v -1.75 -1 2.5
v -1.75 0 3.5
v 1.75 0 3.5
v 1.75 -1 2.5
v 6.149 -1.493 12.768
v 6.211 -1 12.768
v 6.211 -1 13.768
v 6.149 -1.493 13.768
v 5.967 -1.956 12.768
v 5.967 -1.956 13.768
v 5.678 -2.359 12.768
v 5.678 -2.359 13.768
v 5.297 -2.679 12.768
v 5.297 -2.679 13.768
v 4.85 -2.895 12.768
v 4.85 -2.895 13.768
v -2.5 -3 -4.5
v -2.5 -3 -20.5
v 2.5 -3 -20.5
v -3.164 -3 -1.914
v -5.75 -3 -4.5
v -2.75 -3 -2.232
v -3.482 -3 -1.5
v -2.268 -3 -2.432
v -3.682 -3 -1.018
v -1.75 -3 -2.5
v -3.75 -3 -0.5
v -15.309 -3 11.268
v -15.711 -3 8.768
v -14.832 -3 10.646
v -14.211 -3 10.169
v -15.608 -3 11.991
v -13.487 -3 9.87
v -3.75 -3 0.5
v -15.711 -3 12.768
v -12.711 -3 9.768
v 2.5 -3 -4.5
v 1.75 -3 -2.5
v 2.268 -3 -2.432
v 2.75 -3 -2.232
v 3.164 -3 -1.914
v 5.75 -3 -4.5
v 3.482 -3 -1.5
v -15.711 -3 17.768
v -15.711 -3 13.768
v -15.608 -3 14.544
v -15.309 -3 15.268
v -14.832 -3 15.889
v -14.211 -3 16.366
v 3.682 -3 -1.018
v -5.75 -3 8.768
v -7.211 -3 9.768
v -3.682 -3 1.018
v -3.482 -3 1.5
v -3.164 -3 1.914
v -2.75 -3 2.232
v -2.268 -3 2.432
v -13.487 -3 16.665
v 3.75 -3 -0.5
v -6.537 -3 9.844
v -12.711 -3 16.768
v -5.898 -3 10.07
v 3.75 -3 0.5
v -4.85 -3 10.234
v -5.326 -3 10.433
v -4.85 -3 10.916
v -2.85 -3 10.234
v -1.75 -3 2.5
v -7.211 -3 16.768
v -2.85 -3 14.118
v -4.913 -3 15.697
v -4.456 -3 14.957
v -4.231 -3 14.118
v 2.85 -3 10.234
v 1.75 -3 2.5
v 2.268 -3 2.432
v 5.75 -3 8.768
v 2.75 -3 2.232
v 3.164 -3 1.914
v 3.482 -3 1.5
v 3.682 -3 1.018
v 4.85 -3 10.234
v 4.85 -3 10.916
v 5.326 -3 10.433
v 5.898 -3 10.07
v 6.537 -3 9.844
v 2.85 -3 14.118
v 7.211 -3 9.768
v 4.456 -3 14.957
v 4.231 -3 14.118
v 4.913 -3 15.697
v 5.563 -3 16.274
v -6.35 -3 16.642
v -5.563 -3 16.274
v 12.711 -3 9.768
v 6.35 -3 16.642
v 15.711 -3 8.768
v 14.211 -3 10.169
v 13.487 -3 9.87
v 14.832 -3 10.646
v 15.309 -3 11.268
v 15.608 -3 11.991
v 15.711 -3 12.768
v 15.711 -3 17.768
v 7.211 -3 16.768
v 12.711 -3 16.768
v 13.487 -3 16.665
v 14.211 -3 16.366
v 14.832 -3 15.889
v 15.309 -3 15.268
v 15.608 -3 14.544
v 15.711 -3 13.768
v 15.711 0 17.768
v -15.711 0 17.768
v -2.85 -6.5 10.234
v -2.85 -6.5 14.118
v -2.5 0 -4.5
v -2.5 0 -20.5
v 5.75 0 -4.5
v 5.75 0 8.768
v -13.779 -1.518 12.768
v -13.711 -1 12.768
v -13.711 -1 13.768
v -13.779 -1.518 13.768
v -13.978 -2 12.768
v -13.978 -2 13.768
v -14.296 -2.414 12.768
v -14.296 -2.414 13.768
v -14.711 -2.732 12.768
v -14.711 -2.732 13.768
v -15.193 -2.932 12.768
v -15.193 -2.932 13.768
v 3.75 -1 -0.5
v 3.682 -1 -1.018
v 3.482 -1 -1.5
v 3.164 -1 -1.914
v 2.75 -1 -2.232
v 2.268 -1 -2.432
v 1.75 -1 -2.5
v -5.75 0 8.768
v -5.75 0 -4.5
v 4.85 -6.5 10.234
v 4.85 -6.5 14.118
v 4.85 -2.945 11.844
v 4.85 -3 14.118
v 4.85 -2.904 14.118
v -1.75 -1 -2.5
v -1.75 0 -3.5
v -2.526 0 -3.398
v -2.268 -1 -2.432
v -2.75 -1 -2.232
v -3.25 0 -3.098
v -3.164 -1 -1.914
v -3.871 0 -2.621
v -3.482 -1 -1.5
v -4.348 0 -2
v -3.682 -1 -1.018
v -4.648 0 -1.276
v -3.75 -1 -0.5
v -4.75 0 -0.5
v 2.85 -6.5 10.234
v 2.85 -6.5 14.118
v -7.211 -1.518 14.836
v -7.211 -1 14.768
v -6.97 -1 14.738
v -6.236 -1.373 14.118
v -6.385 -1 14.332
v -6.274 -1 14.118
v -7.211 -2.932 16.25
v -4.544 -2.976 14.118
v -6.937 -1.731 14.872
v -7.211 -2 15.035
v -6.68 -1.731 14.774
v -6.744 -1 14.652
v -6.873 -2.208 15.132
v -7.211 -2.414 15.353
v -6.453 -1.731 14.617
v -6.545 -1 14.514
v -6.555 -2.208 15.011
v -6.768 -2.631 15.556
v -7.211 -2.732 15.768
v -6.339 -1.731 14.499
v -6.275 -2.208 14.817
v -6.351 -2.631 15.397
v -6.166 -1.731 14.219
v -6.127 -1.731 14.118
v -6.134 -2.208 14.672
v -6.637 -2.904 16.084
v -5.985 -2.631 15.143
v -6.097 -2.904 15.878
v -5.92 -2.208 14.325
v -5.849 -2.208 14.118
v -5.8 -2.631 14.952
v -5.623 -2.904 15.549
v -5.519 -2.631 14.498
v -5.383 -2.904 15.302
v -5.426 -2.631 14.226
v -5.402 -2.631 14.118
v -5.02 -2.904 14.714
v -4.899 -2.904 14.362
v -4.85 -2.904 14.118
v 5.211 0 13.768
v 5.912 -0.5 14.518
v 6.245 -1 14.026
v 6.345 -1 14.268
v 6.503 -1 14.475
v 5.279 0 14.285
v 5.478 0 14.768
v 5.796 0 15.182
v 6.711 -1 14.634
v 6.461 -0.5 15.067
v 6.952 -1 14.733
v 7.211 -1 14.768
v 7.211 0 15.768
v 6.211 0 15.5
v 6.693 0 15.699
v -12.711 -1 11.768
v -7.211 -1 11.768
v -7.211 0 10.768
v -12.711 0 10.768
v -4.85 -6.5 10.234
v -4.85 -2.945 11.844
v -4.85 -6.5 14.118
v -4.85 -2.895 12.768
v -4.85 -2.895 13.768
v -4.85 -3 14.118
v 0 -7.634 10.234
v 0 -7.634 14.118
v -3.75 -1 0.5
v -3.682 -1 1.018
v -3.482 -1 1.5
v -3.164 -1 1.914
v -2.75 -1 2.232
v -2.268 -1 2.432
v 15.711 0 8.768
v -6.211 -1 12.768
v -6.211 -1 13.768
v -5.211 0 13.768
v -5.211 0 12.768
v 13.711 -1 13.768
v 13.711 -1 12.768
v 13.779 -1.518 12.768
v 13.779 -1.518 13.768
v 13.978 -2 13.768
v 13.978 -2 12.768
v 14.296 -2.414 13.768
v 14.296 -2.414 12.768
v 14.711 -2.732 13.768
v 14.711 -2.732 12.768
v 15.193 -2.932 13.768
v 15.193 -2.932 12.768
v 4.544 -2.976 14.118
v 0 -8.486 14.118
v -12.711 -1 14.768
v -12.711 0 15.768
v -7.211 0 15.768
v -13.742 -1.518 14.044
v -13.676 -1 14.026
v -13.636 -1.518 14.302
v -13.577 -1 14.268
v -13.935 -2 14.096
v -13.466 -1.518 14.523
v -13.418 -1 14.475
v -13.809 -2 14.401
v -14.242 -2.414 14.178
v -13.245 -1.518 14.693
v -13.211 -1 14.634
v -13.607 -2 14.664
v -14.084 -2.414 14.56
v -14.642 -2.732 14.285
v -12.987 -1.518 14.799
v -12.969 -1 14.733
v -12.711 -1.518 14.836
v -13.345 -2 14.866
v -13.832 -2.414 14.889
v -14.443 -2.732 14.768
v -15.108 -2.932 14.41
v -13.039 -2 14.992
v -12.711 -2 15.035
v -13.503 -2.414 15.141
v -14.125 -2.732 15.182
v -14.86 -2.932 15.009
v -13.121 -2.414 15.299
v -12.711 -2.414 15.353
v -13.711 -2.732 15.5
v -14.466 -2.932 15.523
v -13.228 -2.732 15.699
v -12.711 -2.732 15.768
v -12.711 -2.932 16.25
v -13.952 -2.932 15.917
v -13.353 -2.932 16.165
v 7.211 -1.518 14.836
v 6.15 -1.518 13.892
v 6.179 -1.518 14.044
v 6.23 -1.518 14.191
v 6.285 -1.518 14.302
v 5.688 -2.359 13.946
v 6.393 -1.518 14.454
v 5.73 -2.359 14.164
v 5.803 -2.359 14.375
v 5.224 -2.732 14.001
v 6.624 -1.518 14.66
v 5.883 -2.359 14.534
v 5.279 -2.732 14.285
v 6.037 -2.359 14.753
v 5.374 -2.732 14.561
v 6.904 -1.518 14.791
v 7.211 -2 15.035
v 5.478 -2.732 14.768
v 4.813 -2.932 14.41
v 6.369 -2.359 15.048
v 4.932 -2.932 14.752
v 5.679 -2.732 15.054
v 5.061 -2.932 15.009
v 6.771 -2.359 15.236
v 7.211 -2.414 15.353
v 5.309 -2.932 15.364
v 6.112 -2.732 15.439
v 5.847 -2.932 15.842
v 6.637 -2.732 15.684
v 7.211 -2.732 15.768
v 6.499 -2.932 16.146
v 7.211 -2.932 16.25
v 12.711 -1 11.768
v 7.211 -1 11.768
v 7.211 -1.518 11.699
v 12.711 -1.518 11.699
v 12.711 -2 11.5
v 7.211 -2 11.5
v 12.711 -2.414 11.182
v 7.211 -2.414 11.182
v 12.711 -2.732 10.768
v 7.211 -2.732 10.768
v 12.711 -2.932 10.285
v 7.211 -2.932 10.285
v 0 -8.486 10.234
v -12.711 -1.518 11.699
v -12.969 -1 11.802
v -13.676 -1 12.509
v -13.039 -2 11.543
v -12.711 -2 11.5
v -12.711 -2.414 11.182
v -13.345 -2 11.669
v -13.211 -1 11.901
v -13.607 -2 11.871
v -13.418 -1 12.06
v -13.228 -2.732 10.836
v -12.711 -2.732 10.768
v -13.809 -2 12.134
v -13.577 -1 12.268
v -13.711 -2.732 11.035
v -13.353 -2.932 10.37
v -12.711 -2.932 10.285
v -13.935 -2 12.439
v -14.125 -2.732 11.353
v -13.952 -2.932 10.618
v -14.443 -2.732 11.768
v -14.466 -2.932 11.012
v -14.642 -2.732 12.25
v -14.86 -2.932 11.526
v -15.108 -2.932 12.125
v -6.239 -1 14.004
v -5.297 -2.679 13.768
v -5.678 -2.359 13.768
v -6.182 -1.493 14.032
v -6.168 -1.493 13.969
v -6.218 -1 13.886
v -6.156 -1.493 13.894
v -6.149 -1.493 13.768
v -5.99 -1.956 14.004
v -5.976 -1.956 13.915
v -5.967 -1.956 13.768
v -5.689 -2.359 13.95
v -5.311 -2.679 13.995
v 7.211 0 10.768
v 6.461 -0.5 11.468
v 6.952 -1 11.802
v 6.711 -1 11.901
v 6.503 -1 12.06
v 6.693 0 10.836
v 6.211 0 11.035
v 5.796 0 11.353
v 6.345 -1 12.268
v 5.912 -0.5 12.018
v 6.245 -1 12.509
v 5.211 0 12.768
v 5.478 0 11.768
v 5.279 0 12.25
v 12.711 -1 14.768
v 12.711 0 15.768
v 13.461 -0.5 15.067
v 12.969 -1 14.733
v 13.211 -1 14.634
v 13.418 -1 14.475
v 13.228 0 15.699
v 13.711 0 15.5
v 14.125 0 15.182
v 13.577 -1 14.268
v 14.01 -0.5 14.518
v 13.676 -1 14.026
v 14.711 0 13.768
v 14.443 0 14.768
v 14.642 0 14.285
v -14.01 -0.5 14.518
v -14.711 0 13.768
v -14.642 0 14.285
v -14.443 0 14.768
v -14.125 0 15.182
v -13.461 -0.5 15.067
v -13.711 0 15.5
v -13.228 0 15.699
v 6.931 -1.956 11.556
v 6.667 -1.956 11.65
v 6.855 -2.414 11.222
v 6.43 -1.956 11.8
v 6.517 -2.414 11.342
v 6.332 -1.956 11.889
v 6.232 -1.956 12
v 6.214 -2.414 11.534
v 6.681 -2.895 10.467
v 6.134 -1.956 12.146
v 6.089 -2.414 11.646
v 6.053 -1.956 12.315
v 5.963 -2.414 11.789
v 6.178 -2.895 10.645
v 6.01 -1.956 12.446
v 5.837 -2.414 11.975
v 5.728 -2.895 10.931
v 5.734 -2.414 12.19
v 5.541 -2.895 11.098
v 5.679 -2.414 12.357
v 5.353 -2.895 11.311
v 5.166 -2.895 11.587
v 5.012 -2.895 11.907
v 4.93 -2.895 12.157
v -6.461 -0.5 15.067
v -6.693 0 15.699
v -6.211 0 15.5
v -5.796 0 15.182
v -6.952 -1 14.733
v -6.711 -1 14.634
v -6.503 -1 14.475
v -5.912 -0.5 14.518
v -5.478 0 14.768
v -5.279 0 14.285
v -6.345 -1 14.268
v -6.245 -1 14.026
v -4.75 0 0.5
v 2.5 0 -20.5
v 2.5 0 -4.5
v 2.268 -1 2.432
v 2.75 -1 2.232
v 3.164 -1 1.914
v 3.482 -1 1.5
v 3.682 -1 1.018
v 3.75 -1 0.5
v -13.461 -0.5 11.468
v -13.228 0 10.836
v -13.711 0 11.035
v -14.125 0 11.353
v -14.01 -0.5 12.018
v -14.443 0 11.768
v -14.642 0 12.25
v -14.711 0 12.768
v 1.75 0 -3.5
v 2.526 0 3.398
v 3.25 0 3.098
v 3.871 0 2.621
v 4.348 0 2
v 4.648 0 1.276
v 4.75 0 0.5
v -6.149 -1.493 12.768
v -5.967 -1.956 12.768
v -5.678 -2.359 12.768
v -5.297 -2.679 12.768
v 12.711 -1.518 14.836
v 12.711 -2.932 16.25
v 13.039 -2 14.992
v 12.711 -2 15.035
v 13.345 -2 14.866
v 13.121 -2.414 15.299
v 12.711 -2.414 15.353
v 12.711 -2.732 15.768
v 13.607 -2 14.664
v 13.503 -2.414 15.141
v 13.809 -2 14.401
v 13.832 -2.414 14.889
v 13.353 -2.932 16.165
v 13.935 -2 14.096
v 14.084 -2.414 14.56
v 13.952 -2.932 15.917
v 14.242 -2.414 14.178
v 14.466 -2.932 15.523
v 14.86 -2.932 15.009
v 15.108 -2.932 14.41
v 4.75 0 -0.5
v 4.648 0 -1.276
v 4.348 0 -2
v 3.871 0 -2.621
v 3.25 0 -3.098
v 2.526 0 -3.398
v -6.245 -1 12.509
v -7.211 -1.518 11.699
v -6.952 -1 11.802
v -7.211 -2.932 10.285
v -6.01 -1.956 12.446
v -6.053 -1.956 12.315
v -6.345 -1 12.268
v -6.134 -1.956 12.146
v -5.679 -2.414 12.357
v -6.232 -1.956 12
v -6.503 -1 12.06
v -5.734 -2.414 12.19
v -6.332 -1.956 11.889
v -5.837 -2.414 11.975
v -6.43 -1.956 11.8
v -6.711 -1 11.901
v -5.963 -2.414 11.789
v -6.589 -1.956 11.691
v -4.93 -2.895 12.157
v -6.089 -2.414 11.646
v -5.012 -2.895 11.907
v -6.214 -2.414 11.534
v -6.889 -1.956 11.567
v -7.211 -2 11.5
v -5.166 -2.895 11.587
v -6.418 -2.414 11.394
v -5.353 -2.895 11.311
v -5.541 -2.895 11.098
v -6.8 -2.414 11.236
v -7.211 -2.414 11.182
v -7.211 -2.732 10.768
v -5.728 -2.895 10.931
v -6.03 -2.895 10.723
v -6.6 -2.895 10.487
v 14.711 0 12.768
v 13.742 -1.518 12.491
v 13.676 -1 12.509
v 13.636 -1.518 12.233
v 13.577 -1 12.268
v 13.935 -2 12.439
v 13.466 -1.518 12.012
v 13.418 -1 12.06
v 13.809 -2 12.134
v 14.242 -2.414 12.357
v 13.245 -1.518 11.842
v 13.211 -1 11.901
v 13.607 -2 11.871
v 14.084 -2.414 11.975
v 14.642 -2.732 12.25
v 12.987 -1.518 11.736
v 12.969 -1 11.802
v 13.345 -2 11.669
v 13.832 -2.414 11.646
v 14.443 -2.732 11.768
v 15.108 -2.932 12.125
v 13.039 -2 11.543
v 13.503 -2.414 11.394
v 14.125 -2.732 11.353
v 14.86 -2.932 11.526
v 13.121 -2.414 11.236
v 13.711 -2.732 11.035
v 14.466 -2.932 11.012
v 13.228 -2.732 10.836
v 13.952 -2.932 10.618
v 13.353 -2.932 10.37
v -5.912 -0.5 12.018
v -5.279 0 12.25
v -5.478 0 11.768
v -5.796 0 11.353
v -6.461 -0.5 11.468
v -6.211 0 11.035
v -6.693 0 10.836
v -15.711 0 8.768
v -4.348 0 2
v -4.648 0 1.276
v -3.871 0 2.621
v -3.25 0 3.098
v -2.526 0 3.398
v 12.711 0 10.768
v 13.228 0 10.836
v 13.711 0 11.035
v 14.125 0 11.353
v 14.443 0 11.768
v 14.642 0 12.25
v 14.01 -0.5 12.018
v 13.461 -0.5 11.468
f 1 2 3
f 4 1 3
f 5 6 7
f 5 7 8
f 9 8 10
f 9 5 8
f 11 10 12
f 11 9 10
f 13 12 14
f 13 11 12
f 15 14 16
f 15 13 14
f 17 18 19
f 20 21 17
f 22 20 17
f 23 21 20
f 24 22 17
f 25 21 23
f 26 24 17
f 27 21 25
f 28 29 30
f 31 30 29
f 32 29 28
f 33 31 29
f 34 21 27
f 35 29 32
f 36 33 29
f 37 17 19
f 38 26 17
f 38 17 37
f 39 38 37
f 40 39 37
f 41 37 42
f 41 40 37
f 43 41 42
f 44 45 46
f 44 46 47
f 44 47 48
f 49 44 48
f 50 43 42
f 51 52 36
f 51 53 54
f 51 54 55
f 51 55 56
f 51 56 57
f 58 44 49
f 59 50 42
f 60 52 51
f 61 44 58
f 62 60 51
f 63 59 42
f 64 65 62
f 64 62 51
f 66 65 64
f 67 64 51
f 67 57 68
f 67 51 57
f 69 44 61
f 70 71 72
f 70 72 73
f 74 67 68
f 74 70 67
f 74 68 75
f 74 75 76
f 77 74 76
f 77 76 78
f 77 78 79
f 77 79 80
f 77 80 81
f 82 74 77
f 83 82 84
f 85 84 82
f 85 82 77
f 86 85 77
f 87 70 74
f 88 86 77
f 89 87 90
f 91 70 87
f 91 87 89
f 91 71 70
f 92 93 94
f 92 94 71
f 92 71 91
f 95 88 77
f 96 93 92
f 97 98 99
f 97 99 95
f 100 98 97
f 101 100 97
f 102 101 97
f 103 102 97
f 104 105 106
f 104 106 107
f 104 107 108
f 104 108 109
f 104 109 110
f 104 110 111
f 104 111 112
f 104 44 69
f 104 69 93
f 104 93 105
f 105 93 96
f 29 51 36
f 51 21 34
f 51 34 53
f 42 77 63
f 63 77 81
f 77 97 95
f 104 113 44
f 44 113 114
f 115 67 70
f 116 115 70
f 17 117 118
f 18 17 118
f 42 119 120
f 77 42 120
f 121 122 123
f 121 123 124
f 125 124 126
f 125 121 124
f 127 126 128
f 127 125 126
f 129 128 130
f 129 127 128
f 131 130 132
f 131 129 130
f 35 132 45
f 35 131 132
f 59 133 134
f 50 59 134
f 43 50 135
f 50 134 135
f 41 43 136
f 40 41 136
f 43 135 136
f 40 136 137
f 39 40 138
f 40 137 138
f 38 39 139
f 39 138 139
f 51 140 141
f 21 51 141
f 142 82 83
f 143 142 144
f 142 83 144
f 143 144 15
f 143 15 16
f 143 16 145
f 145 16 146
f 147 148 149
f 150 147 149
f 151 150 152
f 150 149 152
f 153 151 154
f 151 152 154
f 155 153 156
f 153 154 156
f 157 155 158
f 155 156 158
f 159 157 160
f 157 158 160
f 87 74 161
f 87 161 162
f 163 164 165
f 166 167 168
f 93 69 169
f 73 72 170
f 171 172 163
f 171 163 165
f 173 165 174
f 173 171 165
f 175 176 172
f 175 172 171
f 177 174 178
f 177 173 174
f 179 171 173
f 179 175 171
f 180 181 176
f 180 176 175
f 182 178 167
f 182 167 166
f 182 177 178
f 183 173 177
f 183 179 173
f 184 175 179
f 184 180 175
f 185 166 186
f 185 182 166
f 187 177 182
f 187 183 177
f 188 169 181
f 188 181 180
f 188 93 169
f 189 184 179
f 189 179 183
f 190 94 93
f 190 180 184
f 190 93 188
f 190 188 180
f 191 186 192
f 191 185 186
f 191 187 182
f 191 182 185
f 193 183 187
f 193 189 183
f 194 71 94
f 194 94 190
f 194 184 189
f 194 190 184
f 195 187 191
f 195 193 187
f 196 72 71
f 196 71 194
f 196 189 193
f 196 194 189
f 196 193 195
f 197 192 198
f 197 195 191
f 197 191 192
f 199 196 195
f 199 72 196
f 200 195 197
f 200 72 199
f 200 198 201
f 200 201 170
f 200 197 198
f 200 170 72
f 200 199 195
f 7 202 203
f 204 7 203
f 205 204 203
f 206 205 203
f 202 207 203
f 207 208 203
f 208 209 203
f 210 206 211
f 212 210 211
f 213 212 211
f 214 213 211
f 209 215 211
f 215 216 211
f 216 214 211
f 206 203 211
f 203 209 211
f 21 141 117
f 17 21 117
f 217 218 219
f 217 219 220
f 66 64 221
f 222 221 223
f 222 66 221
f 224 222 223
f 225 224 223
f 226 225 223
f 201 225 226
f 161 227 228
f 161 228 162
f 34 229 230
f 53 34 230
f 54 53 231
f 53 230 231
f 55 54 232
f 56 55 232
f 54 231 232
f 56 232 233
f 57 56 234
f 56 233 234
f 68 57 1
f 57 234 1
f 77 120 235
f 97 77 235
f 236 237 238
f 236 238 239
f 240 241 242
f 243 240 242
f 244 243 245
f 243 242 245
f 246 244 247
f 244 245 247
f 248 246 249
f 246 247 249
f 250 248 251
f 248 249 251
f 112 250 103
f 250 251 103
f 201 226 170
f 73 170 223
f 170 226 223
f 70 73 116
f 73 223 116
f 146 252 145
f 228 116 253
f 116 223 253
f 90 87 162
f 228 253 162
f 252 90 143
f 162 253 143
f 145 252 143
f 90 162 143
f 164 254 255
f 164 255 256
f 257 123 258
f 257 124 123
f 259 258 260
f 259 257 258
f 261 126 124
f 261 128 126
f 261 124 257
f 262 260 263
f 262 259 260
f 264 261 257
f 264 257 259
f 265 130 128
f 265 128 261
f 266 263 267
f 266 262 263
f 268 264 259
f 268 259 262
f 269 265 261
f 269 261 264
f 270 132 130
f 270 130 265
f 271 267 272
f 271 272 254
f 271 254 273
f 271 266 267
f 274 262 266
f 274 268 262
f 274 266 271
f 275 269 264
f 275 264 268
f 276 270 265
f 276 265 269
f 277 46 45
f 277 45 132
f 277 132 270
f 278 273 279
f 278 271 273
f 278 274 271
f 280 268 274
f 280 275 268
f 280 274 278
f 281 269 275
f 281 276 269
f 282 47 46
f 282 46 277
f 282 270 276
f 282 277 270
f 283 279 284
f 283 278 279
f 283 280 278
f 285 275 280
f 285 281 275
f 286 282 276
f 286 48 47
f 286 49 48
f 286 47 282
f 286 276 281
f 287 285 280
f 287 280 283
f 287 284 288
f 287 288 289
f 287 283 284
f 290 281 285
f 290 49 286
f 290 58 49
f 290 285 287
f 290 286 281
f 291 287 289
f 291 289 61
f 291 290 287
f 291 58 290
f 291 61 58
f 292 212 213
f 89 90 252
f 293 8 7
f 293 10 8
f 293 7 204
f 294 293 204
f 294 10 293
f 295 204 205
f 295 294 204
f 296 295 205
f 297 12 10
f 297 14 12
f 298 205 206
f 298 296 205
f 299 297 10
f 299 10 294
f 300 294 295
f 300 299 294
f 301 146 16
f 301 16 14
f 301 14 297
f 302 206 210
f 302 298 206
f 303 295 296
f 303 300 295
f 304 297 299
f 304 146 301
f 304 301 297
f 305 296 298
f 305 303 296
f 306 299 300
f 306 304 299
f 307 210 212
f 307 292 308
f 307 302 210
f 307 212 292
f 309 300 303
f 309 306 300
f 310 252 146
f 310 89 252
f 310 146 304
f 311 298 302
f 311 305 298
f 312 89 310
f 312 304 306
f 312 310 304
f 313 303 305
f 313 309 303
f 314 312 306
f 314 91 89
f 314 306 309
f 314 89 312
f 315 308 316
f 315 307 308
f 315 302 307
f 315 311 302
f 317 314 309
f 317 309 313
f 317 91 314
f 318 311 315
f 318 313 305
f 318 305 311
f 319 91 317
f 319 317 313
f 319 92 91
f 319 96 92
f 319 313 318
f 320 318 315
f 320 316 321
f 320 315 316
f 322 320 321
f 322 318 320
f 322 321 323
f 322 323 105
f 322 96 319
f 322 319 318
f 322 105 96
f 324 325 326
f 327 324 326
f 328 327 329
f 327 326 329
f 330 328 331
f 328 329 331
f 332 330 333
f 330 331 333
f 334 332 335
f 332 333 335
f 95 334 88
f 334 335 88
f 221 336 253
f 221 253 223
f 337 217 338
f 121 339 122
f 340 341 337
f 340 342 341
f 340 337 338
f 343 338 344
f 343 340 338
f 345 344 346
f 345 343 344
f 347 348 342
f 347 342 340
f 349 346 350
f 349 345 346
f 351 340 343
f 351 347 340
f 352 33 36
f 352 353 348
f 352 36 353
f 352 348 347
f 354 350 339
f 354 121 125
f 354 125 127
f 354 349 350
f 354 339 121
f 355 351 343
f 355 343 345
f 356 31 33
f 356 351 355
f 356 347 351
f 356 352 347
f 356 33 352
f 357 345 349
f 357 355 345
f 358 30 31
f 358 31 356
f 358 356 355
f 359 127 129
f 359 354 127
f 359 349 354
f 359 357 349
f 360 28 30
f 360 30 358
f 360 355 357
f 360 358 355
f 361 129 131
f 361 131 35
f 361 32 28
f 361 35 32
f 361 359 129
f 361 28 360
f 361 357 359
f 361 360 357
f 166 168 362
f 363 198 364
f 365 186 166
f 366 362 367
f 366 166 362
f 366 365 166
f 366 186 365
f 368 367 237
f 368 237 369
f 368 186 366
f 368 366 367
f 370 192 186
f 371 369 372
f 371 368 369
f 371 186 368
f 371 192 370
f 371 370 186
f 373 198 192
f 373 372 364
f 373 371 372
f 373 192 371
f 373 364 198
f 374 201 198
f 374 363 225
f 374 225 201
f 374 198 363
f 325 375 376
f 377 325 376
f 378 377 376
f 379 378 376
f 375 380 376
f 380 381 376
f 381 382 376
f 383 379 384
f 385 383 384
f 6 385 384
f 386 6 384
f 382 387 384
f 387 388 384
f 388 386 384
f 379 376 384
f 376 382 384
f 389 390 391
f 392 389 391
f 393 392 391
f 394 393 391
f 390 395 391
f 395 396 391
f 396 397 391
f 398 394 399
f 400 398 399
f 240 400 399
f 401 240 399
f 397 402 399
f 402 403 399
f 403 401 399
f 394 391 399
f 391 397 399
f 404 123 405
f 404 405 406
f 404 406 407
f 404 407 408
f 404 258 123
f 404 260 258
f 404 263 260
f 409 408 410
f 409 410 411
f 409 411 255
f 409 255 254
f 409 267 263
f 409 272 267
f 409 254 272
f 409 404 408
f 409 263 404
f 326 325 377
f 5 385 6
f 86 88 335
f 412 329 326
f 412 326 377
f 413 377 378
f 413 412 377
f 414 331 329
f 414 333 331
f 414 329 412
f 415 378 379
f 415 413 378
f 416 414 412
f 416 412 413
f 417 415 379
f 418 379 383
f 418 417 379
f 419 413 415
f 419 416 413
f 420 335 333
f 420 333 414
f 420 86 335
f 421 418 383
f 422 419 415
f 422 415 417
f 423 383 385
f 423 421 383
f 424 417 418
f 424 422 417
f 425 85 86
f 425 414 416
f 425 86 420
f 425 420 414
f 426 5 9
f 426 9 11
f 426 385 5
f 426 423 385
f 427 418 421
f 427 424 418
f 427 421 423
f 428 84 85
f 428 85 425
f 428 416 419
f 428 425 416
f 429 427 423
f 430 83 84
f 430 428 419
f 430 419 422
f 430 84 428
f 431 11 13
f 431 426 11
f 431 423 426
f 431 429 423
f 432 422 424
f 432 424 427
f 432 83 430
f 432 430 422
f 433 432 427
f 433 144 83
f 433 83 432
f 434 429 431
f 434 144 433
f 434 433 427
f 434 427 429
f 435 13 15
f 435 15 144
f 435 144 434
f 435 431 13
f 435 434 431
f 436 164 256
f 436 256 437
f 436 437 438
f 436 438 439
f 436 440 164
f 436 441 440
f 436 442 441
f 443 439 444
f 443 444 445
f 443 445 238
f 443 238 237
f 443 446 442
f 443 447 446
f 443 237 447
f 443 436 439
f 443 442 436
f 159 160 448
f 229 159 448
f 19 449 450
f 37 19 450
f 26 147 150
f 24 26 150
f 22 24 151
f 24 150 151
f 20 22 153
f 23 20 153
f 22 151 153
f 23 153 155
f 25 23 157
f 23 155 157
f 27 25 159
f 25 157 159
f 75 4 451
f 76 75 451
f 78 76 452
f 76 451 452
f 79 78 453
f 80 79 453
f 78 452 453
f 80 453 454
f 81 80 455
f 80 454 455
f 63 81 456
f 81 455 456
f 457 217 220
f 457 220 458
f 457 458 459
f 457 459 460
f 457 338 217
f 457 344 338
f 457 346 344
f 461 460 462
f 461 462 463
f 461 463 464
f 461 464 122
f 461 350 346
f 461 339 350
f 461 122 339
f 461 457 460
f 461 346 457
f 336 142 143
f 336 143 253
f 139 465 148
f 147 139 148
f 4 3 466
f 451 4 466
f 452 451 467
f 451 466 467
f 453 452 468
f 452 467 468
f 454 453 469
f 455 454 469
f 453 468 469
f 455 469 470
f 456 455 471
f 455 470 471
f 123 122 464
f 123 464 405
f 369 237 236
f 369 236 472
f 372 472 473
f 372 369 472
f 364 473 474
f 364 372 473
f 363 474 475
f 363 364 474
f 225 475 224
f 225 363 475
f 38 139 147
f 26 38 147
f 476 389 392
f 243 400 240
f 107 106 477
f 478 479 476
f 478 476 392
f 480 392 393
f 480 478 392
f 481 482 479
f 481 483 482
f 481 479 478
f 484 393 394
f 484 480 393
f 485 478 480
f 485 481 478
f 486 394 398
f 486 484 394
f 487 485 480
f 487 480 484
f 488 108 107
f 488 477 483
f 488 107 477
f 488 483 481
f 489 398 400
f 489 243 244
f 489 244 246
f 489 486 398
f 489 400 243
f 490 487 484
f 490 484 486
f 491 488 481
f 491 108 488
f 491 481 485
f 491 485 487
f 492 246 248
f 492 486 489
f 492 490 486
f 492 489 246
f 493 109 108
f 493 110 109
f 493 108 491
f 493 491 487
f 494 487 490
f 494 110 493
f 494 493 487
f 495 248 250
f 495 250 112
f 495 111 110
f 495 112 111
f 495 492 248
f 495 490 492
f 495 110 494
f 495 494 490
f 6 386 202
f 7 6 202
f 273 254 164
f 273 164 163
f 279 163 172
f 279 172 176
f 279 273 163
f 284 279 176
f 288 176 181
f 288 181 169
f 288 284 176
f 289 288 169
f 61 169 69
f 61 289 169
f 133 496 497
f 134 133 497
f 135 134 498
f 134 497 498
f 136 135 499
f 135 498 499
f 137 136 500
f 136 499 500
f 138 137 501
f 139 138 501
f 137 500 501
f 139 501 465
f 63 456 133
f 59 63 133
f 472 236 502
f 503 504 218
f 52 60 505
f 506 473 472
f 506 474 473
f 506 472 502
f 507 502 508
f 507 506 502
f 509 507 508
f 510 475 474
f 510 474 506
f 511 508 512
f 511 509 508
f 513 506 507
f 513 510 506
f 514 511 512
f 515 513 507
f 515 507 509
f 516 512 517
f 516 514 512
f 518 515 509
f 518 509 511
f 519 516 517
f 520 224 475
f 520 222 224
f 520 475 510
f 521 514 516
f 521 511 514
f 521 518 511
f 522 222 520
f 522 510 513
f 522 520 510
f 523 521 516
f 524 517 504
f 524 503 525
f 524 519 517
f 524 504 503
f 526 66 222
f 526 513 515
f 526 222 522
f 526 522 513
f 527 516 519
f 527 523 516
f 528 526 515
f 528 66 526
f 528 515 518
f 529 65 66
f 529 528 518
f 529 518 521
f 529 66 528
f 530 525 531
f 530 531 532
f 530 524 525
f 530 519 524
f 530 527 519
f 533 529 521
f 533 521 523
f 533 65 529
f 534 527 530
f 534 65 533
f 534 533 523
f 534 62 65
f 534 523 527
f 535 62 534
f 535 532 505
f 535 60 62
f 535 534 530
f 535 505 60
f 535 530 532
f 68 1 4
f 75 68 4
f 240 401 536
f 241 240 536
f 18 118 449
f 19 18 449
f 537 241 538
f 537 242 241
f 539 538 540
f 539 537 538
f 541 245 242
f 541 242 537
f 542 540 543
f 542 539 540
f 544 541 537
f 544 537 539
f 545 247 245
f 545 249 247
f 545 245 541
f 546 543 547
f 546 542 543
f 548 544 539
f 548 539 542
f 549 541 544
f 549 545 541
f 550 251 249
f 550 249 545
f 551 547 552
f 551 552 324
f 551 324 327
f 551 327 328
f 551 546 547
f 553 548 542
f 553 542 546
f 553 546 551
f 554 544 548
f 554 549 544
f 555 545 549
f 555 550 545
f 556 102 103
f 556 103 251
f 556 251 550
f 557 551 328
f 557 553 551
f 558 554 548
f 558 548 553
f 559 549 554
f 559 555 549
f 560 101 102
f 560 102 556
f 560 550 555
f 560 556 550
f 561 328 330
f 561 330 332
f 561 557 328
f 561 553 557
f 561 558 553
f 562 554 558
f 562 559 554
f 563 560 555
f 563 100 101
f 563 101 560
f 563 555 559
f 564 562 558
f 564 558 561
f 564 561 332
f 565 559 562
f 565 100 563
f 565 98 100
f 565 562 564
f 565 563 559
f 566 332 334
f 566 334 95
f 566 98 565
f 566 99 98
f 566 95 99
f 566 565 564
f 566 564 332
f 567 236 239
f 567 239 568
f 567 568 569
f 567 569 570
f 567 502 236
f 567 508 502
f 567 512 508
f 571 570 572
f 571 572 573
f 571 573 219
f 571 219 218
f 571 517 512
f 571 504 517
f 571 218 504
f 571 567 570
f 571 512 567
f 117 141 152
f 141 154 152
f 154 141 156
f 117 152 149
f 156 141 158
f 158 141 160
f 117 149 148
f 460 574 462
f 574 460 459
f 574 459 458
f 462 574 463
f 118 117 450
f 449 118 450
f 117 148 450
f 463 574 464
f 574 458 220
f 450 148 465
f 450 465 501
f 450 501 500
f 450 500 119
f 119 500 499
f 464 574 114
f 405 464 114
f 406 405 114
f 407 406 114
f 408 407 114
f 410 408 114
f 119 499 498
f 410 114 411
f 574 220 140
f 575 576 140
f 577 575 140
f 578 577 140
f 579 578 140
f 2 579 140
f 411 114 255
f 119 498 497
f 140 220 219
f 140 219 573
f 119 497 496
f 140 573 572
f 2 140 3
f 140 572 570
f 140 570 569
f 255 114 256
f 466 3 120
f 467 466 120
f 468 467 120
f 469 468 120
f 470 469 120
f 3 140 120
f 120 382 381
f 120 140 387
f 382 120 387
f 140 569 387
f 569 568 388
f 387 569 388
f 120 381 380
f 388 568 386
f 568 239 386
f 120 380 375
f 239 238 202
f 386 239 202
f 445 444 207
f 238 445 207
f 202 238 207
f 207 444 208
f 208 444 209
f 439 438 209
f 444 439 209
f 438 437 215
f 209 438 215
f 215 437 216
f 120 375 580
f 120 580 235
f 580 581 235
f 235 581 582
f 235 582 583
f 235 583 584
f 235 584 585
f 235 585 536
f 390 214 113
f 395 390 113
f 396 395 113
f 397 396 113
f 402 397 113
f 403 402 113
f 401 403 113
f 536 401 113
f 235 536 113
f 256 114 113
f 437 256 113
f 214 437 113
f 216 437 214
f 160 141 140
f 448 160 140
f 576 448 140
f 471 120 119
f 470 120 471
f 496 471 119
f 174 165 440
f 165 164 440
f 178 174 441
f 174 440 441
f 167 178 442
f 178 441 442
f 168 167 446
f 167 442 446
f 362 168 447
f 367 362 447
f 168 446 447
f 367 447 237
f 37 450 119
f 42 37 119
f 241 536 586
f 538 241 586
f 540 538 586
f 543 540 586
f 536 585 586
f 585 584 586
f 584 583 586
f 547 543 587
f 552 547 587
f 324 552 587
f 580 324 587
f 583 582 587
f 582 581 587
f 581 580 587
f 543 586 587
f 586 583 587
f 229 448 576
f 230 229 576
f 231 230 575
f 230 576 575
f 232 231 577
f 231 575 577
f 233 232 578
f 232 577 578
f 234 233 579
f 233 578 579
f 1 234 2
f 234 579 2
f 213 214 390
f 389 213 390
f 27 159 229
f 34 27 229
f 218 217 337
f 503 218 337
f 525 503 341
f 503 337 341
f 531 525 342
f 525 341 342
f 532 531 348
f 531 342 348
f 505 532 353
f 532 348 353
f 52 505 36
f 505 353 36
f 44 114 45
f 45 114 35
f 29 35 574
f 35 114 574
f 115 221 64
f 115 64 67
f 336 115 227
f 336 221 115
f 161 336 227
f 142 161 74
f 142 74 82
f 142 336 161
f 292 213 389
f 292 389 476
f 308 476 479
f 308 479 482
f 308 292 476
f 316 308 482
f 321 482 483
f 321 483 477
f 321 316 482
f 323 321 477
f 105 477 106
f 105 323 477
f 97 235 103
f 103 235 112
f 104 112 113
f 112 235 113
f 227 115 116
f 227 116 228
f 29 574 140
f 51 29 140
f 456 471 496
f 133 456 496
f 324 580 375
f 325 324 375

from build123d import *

# Parameters (mm, degrees)
F0_W         = 2
F0_H         = 3.8832901515
F1_DEPTH     = 3
F2_DEPTH     = 3
F2_FACE_W    = 2
F2_FACE_H    = 3.8832901515
F3_DEPTH     = 3.5
F5_DEPTH     = 3.8832901515
F6_T1_DEPTH  = 5.5
F6_T3_DEPTH  = 5.5
F6_T5_DEPTH  = 1
F6_T8_ANGLE  = 90
F6_T12_ANGLE = 90
F6_T17_DEPTH = 1
F6_T22_ANGLE = 90
F6_T28_ANGLE = 90
F6_T34_ANGLE = 90
F6_T38_ANGLE = 90
F6_T42_ANGLE = 90
F6_T45_ANGLE = 90
F6_T47_ANGLE = 90
F6_T51_ANGLE = 90
F6_T57_ANGLE = 90
F6_T63_ANGLE = 90
F6_T69_DEPTH = 1
F7_SIZE      = 0.99999


# Not quite as in the source:
# - a fillet or chamfer that OpenCascade refuses, or shapes differently, is made with other operations: its cross-section is extruded or revolved along the edge and cut away or added
# - a fillet or chamfer is up to 0.001 mm smaller than in the source, because OpenCascade refuses the exact size


with BuildPart() as f1:
    # F0 (on Front) → F1 (new body)
    with BuildSketch(Plane.XZ):
        Polygon((15.7105413526, 17.7675217465), (-5.75, 17.7675217465), (-15.7105413526, 17.7675217465), (-15.7105413526, 8.7675217465), (-5.75, 8.7675217465), (-5.75, -4.5), (-2.5, -4.5), (-2.5, -20.5), (2.5, -20.5), (2.5, -4.5), (5.75, -4.5), (5.75, 8.7675217465), (15.7105413526, 8.7675217465), (15.7105413526, 15.6582586542), align=None)
        with BuildLine():
            Line((-12.7105413526, 14.7675217465), (-7.2105413526, 14.7675217465))
            ThreePointArc((-7.2105413526, 14.7675217465), (-6.5034345714, 14.4746285276), (-6.2105413526, 13.7675217465))
            Line((-6.2105413526, 13.7675217465), (-6.2105413526, 12.7675217465))
            ThreePointArc((-6.2105413526, 12.7675217465), (-6.5034345714, 12.0604149653), (-7.2105413526, 11.7675217465))
            Line((-7.2105413526, 11.7675217465), (-12.7105413526, 11.7675217465))
            ThreePointArc((-12.7105413526, 11.7675217465), (-13.4176481338, 12.0604149653), (-13.7105413526, 12.7675217465))
            Line((-13.7105413526, 12.7675217465), (-13.7105413526, 13.7675217465))
            ThreePointArc((-13.7105413526, 13.7675217465), (-13.4176481338, 14.4746285276), (-12.7105413526, 14.7675217465))
        make_face(mode=Mode.SUBTRACT)
        with Locations((-3.85, 12.1758766707)):
            Rectangle(F0_W, F0_H, mode=Mode.SUBTRACT)
        with BuildLine():
            ThreePointArc((-3.75, 0.5), (-3.1642135624, 1.9142135624), (-1.75, 2.5))
            Line((-1.75, 2.5), (1.75, 2.5))
            ThreePointArc((1.75, 2.5), (3.1642135624, 1.9142135624), (3.75, 0.5))
            Line((3.75, 0.5), (3.75, -0.5))
            ThreePointArc((3.75, -0.5), (3.1642135624, -1.9142135624), (1.75, -2.5))
            Line((1.75, -2.5), (-1.75, -2.5))
            ThreePointArc((-1.75, -2.5), (-3.1642135624, -1.9142135624), (-3.75, -0.5))
            Line((-3.75, -0.5), (-3.75, 0.5))
        make_face(mode=Mode.SUBTRACT)
        with Locations((3.85, 12.1758766707)):
            Rectangle(F0_W, F0_H, mode=Mode.SUBTRACT)
        with BuildLine():
            ThreePointArc((7.2105413526, 11.7675217465), (6.5034345714, 12.0604149653), (6.2105413526, 12.7675217465))
            Line((6.2105413526, 12.7675217465), (6.2105413526, 13.7675217465))
            ThreePointArc((6.2105413526, 13.7675217465), (6.5034345714, 14.4746285276), (7.2105413526, 14.7675217465))
            Line((7.2105413526, 14.7675217465), (12.7105413526, 14.7675217465))
            ThreePointArc((12.7105413526, 14.7675217465), (13.4176481338, 14.4746285276), (13.7105413526, 13.7675217465))
            Line((13.7105413526, 13.7675217465), (13.7105413526, 12.7675217465))
            ThreePointArc((13.7105413526, 12.7675217465), (13.4176481338, 12.0604149653), (12.7105413526, 11.7675217465))
            Line((12.7105413526, 11.7675217465), (7.2105413526, 11.7675217465))
        make_face(mode=Mode.SUBTRACT)
    extrude(amount=F1_DEPTH)



with BuildPart() as f2:
    # F0 (on Front) → F2 (new body, through all)
    with BuildSketch(Plane.XZ):
        with Locations((-3.85, 12.1758766707)):
            Rectangle(F0_W, F0_H)
    extrude(amount=F2_DEPTH)


with BuildPart() as f2b:
    # F0 (on Front) → F2, piece 2 (new body, through all)
    with BuildSketch(Plane.XZ):
        with Locations((3.85, 12.1758766707)):
            Rectangle(F0_W, F0_H)
    extrude(amount=F2_DEPTH)


with BuildPart() as f1_1:
    add(f1.part)

    add(f2.part)  # F3 merges F2

    add(f2b.part)  # F3 merges F2b
    # F2_face (on face) → F3 (join)
    with BuildSketch(Plane(origin=(-3.85, -3, 12.1758766707), x_dir=(1, 0, 0), z_dir=(0, -1, 0))):
        Rectangle(F2_FACE_W, F2_FACE_H)
        with Locations((7.7, 0)):
            Rectangle(F2_FACE_W, F2_FACE_H)
    extrude(amount=F3_DEPTH)

    # F4 (on face) → F5 (join, through all)
    with BuildSketch(Plane(origin=(0, 0, 10.2342315949), x_dir=(1, 0, 0), z_dir=(0, 0, -1))):
        Polygon((-4.85, 6.5), (-2.85, 6.5), (0, 7.6338006184), (2.85, 6.5), (4.85, 6.5), (0, 8.4861256182), align=None)
    extrude(amount=-F5_DEPTH)

    # F6: fillet of radius 2 on 2 edges, made by hand

    # F6_s2 → F6_t1 (cut)
    with BuildSketch(Plane.YZ.offset(-12.7105413526)):
        with BuildLine():
            ThreePointArc((-1, 11.7675217465), (-2.4142135624, 11.1817353088), (-3, 9.7675217465))
            Line((-3, 9.7675217465), (-3, 11.7675217465))
            Line((-3, 11.7675217465), (-1, 11.7675217465))
        make_face()
        with BuildLine():
            ThreePointArc((-1, 14.7675217465), (-2.4142135624, 15.3533081841), (-3, 16.7675217465))
            Line((-3, 16.7675217465), (-3, 14.7675217465))
            Line((-3, 14.7675217465), (-1, 14.7675217465))
        make_face()
    extrude(amount=F6_T1_DEPTH, mode=Mode.SUBTRACT)

    # F6_s4 → F6_t3 (cut)
    with BuildSketch(Plane.YZ.offset(7.2105413526)):
        with BuildLine():
            ThreePointArc((-1, 11.7675217465), (-2.4142135624, 11.1817353088), (-3, 9.7675217465))
            Line((-3, 9.7675217465), (-3, 11.7675217465))
            Line((-3, 11.7675217465), (-1, 11.7675217465))
        make_face()
        with BuildLine():
            ThreePointArc((-1, 14.7675217465), (-2.4142135624, 15.3533081841), (-3, 16.7675217465))
            Line((-3, 16.7675217465), (-3, 14.7675217465))
            Line((-3, 14.7675217465), (-1, 14.7675217465))
        make_face()
    extrude(amount=F6_T3_DEPTH, mode=Mode.SUBTRACT)

    # F6_s6 → F6_t5 (cut)
    with BuildSketch(Plane.XY.offset(12.7675217465)):
        with BuildLine():
            ThreePointArc((13.7105413526, -1), (14.2963277903, -2.4142135624), (15.7105413526, -3))
            Line((15.7105413526, -3), (13.7105413526, -3))
            Line((13.7105413526, -3), (13.7105413526, -1))
        make_face()
        with BuildLine():
            ThreePointArc((-13.7105413526, -1), (-14.2963277903, -2.4142135624), (-15.7105413526, -3))
            Line((-15.7105413526, -3), (-13.7105413526, -3))
            Line((-13.7105413526, -3), (-13.7105413526, -1))
        make_face()
    extrude(amount=F6_T5_DEPTH, mode=Mode.SUBTRACT)

    # F6_s7 → F6_t8 (revolve, cut)
    with BuildSketch(Plane.XY.offset(12.7675217465)):
        with BuildLine():
            ThreePointArc((13.7105413526, -1), (14.2963277903, -2.4142135624), (15.7105413526, -3))
            Line((15.7105413526, -3), (13.7105413526, -3))
            Line((13.7105413526, -3), (13.7105413526, -1))
        make_face()
    revolve(axis=Axis((12.7105413526, -3, 12.7675217465), (0, 1, 0)), revolution_arc=F6_T8_ANGLE, mode=Mode.SUBTRACT)


with BuildPart() as f6_tool10:
    # F6_s11 → F6_t12 (revolve)
    with BuildSketch(Plane.YZ.offset(7.2105413526)):
        with BuildLine():
            ThreePointArc((-1, 11.7675217465), (-2.4142135624, 11.1817353088), (-3, 9.7675217465))
            Line((-3, 9.7675217465), (-3, 11.7675217465))
            Line((-3, 11.7675217465), (-1, 11.7675217465))
        make_face()
    revolve(axis=Axis((7.2105413526, -3, 12.7675217465), (0, 1, 0)), revolution_arc=F6_T12_ANGLE)

    split(bisect_by=Plane.YZ.offset(4.85), keep=Keep.TOP)


with BuildPart() as f1_2:
    add(f1_1.part)

    # F6_t9: cut F6_tool10
    add(f6_tool10.part, mode=Mode.SUBTRACT)


with BuildPart() as f6_tool15:
    # F6_s16 → F6_t17 (new body)
    with BuildSketch(Plane.XY.offset(12.7675217465)):
        with BuildLine():
            ThreePointArc((6.2105413526, -1), (5.624754915, -2.4142135624), (4.2105413526, -3))
            Line((4.2105413526, -3), (6.2105413526, -3))
            Line((6.2105413526, -3), (6.2105413526, -1))
        make_face()
    extrude(amount=F6_T17_DEPTH)

    split(bisect_by=Plane.YZ.offset(4.85), keep=Keep.TOP)


with BuildPart() as f1_3:
    add(f1_2.part)

    # F6_t14: cut F6_tool15
    add(f6_tool15.part, mode=Mode.SUBTRACT)


with BuildPart() as f6_tool20:
    # F6_s21 → F6_t22 (revolve)
    with BuildSketch(Plane.XY.offset(13.7675217465)):
        with BuildLine():
            ThreePointArc((6.2105413526, -1), (5.624754915, -2.4142135624), (4.2105413526, -3))
            Line((4.2105413526, -3), (6.2105413526, -3))
            Line((6.2105413526, -3), (6.2105413526, -1))
        make_face()
    revolve(axis=Axis((7.2105413526, -3, 13.7675217465), (0, 1, 0)), revolution_arc=F6_T22_ANGLE)

    split(bisect_by=Plane.XY.offset(14.1175217465), keep=Keep.BOTTOM)

    split(bisect_by=Plane.YZ.offset(4.85), keep=Keep.TOP)


with BuildPart() as f1_4:
    add(f1_3.part)

    # F6_t19: cut F6_tool20
    add(f6_tool20.part, mode=Mode.SUBTRACT)


with BuildPart() as f6_tool26:
    # F6_s27 → F6_t28 (revolve)
    with BuildSketch(Plane.XY.offset(13.7675217465)):
        with BuildLine():
            ThreePointArc((6.2105413526, -1), (5.624754915, -2.4142135624), (4.2105413526, -3))
            Line((4.2105413526, -3), (6.2105413526, -3))
            Line((6.2105413526, -3), (6.2105413526, -1))
        make_face()
    revolve(axis=Axis((7.2105413526, -3, 13.7675217465), (0, 1, 0)), revolution_arc=F6_T28_ANGLE)

    split(bisect_by=Plane.XY.offset(14.1175217465), keep=Keep.TOP)

    split(bisect_by=Plane.YZ.offset(4.85), keep=Keep.TOP)


with BuildPart() as f1_5:
    add(f1_4.part)

    # F6_t25: cut F6_tool26
    add(f6_tool26.part, mode=Mode.SUBTRACT)


with BuildPart() as f6_tool32:
    # F6_s33 → F6_t34 (revolve)
    with BuildSketch(Plane.XY.offset(13.7675217465)):
        with BuildLine():
            ThreePointArc((6.2105413526, -1), (5.624754915, -2.4142135624), (4.2105413526, -3))
            Line((4.2105413526, -3), (6.2105413526, -3))
            Line((6.2105413526, -3), (6.2105413526, -1))
        make_face()
    revolve(axis=Axis((7.2105413526, -3, 13.7675217465), (0, 1, 0)), revolution_arc=F6_T34_ANGLE)

    split(bisect_by=Plane.XY.offset(14.1175217465), keep=Keep.TOP)

    split(bisect_by=Plane.YZ.offset(4.85), keep=Keep.BOTTOM)


with BuildPart() as f1_6:
    add(f1_5.part)

    # F6_t31: cut F6_tool32
    add(f6_tool32.part, mode=Mode.SUBTRACT)

    # F6_s37 → F6_t38 (revolve, cut)
    with BuildSketch(Plane.YZ.offset(12.7105413526)):
        with BuildLine():
            ThreePointArc((-1, 14.7675217465), (-2.4142135624, 15.3533081841), (-3, 16.7675217465))
            Line((-3, 16.7675217465), (-3, 14.7675217465))
            Line((-3, 14.7675217465), (-1, 14.7675217465))
        make_face()
    revolve(axis=Axis((12.7105413526, -3, 13.7675217465), (0, 1, 0)), revolution_arc=F6_T38_ANGLE, mode=Mode.SUBTRACT)


with BuildPart() as f6_tool40:
    # F6_s41 → F6_t42 (revolve)
    with BuildSketch(Plane.XY.offset(12.7675217465)):
        with BuildLine():
            ThreePointArc((-6.2105413526, -1), (-5.624754915, -2.4142135624), (-4.2105413526, -3))
            Line((-4.2105413526, -3), (-6.2105413526, -3))
            Line((-6.2105413526, -3), (-6.2105413526, -1))
        make_face()
    revolve(axis=Axis((-7.2105413526, -3, 12.7675217465), (0, 1, 0)), revolution_arc=F6_T42_ANGLE)

    split(bisect_by=Plane.YZ.offset(-4.85), keep=Keep.BOTTOM)


with BuildPart() as f1_7:
    add(f1_6.part)

    # F6_t39: cut F6_tool40
    add(f6_tool40.part, mode=Mode.SUBTRACT)

    # F6_s44 → F6_t45 (revolve, cut)
    with BuildSketch(Plane.YZ.offset(-12.7105413526)):
        with BuildLine():
            ThreePointArc((-1, 11.7675217465), (-2.4142135624, 11.1817353088), (-3, 9.7675217465))
            Line((-3, 9.7675217465), (-3, 11.7675217465))
            Line((-3, 11.7675217465), (-1, 11.7675217465))
        make_face()
    revolve(axis=Axis((-12.7105413526, -3, 12.7675217465), (0, 1, 0)), revolution_arc=F6_T45_ANGLE, mode=Mode.SUBTRACT)

    # F6_s46 → F6_t47 (revolve, cut)
    with BuildSketch(Plane.XY.offset(13.7675217465)):
        with BuildLine():
            ThreePointArc((-13.7105413526, -1), (-14.2963277903, -2.4142135624), (-15.7105413526, -3))
            Line((-15.7105413526, -3), (-13.7105413526, -3))
            Line((-13.7105413526, -3), (-13.7105413526, -1))
        make_face()
    revolve(axis=Axis((-12.7105413526, -3, 13.7675217465), (0, 1, 0)), revolution_arc=F6_T47_ANGLE, mode=Mode.SUBTRACT)


with BuildPart() as f6_tool49:
    # F6_s50 → F6_t51 (revolve)
    with BuildSketch(Plane.YZ.offset(-7.2105413526)):
        with BuildLine():
            ThreePointArc((-1, 14.7675217465), (-2.4142135624, 15.3533081841), (-3, 16.7675217465))
            Line((-3, 16.7675217465), (-3, 14.7675217465))
            Line((-3, 14.7675217465), (-1, 14.7675217465))
        make_face()
    revolve(axis=Axis((-7.2105413526, -3, 13.7675217465), (0, 1, 0)), revolution_arc=F6_T51_ANGLE)

    split(bisect_by=Plane.XY.offset(14.1175217465), keep=Keep.TOP)

    split(bisect_by=Plane.YZ.offset(-4.85), keep=Keep.BOTTOM)


with BuildPart() as f1_8:
    add(f1_7.part)

    # F6_t48: cut F6_tool49
    add(f6_tool49.part, mode=Mode.SUBTRACT)


with BuildPart() as f6_tool55:
    # F6_s56 → F6_t57 (revolve)
    with BuildSketch(Plane.YZ.offset(-7.2105413526)):
        with BuildLine():
            ThreePointArc((-1, 14.7675217465), (-2.4142135624, 15.3533081841), (-3, 16.7675217465))
            Line((-3, 16.7675217465), (-3, 14.7675217465))
            Line((-3, 14.7675217465), (-1, 14.7675217465))
        make_face()
    revolve(axis=Axis((-7.2105413526, -3, 13.7675217465), (0, 1, 0)), revolution_arc=F6_T57_ANGLE)

    split(bisect_by=Plane.XY.offset(14.1175217465), keep=Keep.TOP)

    split(bisect_by=Plane.YZ.offset(-4.85), keep=Keep.TOP)


with BuildPart() as f1_9:
    add(f1_8.part)

    # F6_t54: cut F6_tool55
    add(f6_tool55.part, mode=Mode.SUBTRACT)


with BuildPart() as f6_tool61:
    # F6_s62 → F6_t63 (revolve)
    with BuildSketch(Plane.YZ.offset(-7.2105413526)):
        with BuildLine():
            ThreePointArc((-1, 14.7675217465), (-2.4142135624, 15.3533081841), (-3, 16.7675217465))
            Line((-3, 16.7675217465), (-3, 14.7675217465))
            Line((-3, 14.7675217465), (-1, 14.7675217465))
        make_face()
    revolve(axis=Axis((-7.2105413526, -3, 13.7675217465), (0, 1, 0)), revolution_arc=F6_T63_ANGLE)

    split(bisect_by=Plane.XY.offset(14.1175217465), keep=Keep.BOTTOM)

    split(bisect_by=Plane.YZ.offset(-4.85), keep=Keep.BOTTOM)


with BuildPart() as f1_10:
    add(f1_9.part)

    # F6_t60: cut F6_tool61
    add(f6_tool61.part, mode=Mode.SUBTRACT)


with BuildPart() as f6_tool67:
    # F6_s68 → F6_t69 (new body)
    with BuildSketch(Plane.XY.offset(13.7675217465)):
        with BuildLine():
            ThreePointArc((-6.2105413526, -1), (-5.624754915, -2.4142135624), (-4.2105413526, -3))
            Line((-4.2105413526, -3), (-6.2105413526, -3))
            Line((-6.2105413526, -3), (-6.2105413526, -1))
        make_face()
    extrude(amount=-F6_T69_DEPTH)

    split(bisect_by=Plane.YZ.offset(-4.85), keep=Keep.BOTTOM)


with BuildPart() as f1_11:
    add(f1_10.part)

    # F6_t66: cut F6_tool67
    add(f6_tool67.part, mode=Mode.SUBTRACT)

    # F7 (size 1 in the source; OpenCascade refuses exactly that, so slightly less here)
    f7_edges = [f1_11.edges().sort_by_distance(p)[0] for p in [
        (-9.960541, 0, 11.767522),
        (6.503435, 0, 14.474629),
        (0, 0, 2.5),
    ]]
    chamfer(f7_edges, length=F7_SIZE)


solid = f1_11.part
